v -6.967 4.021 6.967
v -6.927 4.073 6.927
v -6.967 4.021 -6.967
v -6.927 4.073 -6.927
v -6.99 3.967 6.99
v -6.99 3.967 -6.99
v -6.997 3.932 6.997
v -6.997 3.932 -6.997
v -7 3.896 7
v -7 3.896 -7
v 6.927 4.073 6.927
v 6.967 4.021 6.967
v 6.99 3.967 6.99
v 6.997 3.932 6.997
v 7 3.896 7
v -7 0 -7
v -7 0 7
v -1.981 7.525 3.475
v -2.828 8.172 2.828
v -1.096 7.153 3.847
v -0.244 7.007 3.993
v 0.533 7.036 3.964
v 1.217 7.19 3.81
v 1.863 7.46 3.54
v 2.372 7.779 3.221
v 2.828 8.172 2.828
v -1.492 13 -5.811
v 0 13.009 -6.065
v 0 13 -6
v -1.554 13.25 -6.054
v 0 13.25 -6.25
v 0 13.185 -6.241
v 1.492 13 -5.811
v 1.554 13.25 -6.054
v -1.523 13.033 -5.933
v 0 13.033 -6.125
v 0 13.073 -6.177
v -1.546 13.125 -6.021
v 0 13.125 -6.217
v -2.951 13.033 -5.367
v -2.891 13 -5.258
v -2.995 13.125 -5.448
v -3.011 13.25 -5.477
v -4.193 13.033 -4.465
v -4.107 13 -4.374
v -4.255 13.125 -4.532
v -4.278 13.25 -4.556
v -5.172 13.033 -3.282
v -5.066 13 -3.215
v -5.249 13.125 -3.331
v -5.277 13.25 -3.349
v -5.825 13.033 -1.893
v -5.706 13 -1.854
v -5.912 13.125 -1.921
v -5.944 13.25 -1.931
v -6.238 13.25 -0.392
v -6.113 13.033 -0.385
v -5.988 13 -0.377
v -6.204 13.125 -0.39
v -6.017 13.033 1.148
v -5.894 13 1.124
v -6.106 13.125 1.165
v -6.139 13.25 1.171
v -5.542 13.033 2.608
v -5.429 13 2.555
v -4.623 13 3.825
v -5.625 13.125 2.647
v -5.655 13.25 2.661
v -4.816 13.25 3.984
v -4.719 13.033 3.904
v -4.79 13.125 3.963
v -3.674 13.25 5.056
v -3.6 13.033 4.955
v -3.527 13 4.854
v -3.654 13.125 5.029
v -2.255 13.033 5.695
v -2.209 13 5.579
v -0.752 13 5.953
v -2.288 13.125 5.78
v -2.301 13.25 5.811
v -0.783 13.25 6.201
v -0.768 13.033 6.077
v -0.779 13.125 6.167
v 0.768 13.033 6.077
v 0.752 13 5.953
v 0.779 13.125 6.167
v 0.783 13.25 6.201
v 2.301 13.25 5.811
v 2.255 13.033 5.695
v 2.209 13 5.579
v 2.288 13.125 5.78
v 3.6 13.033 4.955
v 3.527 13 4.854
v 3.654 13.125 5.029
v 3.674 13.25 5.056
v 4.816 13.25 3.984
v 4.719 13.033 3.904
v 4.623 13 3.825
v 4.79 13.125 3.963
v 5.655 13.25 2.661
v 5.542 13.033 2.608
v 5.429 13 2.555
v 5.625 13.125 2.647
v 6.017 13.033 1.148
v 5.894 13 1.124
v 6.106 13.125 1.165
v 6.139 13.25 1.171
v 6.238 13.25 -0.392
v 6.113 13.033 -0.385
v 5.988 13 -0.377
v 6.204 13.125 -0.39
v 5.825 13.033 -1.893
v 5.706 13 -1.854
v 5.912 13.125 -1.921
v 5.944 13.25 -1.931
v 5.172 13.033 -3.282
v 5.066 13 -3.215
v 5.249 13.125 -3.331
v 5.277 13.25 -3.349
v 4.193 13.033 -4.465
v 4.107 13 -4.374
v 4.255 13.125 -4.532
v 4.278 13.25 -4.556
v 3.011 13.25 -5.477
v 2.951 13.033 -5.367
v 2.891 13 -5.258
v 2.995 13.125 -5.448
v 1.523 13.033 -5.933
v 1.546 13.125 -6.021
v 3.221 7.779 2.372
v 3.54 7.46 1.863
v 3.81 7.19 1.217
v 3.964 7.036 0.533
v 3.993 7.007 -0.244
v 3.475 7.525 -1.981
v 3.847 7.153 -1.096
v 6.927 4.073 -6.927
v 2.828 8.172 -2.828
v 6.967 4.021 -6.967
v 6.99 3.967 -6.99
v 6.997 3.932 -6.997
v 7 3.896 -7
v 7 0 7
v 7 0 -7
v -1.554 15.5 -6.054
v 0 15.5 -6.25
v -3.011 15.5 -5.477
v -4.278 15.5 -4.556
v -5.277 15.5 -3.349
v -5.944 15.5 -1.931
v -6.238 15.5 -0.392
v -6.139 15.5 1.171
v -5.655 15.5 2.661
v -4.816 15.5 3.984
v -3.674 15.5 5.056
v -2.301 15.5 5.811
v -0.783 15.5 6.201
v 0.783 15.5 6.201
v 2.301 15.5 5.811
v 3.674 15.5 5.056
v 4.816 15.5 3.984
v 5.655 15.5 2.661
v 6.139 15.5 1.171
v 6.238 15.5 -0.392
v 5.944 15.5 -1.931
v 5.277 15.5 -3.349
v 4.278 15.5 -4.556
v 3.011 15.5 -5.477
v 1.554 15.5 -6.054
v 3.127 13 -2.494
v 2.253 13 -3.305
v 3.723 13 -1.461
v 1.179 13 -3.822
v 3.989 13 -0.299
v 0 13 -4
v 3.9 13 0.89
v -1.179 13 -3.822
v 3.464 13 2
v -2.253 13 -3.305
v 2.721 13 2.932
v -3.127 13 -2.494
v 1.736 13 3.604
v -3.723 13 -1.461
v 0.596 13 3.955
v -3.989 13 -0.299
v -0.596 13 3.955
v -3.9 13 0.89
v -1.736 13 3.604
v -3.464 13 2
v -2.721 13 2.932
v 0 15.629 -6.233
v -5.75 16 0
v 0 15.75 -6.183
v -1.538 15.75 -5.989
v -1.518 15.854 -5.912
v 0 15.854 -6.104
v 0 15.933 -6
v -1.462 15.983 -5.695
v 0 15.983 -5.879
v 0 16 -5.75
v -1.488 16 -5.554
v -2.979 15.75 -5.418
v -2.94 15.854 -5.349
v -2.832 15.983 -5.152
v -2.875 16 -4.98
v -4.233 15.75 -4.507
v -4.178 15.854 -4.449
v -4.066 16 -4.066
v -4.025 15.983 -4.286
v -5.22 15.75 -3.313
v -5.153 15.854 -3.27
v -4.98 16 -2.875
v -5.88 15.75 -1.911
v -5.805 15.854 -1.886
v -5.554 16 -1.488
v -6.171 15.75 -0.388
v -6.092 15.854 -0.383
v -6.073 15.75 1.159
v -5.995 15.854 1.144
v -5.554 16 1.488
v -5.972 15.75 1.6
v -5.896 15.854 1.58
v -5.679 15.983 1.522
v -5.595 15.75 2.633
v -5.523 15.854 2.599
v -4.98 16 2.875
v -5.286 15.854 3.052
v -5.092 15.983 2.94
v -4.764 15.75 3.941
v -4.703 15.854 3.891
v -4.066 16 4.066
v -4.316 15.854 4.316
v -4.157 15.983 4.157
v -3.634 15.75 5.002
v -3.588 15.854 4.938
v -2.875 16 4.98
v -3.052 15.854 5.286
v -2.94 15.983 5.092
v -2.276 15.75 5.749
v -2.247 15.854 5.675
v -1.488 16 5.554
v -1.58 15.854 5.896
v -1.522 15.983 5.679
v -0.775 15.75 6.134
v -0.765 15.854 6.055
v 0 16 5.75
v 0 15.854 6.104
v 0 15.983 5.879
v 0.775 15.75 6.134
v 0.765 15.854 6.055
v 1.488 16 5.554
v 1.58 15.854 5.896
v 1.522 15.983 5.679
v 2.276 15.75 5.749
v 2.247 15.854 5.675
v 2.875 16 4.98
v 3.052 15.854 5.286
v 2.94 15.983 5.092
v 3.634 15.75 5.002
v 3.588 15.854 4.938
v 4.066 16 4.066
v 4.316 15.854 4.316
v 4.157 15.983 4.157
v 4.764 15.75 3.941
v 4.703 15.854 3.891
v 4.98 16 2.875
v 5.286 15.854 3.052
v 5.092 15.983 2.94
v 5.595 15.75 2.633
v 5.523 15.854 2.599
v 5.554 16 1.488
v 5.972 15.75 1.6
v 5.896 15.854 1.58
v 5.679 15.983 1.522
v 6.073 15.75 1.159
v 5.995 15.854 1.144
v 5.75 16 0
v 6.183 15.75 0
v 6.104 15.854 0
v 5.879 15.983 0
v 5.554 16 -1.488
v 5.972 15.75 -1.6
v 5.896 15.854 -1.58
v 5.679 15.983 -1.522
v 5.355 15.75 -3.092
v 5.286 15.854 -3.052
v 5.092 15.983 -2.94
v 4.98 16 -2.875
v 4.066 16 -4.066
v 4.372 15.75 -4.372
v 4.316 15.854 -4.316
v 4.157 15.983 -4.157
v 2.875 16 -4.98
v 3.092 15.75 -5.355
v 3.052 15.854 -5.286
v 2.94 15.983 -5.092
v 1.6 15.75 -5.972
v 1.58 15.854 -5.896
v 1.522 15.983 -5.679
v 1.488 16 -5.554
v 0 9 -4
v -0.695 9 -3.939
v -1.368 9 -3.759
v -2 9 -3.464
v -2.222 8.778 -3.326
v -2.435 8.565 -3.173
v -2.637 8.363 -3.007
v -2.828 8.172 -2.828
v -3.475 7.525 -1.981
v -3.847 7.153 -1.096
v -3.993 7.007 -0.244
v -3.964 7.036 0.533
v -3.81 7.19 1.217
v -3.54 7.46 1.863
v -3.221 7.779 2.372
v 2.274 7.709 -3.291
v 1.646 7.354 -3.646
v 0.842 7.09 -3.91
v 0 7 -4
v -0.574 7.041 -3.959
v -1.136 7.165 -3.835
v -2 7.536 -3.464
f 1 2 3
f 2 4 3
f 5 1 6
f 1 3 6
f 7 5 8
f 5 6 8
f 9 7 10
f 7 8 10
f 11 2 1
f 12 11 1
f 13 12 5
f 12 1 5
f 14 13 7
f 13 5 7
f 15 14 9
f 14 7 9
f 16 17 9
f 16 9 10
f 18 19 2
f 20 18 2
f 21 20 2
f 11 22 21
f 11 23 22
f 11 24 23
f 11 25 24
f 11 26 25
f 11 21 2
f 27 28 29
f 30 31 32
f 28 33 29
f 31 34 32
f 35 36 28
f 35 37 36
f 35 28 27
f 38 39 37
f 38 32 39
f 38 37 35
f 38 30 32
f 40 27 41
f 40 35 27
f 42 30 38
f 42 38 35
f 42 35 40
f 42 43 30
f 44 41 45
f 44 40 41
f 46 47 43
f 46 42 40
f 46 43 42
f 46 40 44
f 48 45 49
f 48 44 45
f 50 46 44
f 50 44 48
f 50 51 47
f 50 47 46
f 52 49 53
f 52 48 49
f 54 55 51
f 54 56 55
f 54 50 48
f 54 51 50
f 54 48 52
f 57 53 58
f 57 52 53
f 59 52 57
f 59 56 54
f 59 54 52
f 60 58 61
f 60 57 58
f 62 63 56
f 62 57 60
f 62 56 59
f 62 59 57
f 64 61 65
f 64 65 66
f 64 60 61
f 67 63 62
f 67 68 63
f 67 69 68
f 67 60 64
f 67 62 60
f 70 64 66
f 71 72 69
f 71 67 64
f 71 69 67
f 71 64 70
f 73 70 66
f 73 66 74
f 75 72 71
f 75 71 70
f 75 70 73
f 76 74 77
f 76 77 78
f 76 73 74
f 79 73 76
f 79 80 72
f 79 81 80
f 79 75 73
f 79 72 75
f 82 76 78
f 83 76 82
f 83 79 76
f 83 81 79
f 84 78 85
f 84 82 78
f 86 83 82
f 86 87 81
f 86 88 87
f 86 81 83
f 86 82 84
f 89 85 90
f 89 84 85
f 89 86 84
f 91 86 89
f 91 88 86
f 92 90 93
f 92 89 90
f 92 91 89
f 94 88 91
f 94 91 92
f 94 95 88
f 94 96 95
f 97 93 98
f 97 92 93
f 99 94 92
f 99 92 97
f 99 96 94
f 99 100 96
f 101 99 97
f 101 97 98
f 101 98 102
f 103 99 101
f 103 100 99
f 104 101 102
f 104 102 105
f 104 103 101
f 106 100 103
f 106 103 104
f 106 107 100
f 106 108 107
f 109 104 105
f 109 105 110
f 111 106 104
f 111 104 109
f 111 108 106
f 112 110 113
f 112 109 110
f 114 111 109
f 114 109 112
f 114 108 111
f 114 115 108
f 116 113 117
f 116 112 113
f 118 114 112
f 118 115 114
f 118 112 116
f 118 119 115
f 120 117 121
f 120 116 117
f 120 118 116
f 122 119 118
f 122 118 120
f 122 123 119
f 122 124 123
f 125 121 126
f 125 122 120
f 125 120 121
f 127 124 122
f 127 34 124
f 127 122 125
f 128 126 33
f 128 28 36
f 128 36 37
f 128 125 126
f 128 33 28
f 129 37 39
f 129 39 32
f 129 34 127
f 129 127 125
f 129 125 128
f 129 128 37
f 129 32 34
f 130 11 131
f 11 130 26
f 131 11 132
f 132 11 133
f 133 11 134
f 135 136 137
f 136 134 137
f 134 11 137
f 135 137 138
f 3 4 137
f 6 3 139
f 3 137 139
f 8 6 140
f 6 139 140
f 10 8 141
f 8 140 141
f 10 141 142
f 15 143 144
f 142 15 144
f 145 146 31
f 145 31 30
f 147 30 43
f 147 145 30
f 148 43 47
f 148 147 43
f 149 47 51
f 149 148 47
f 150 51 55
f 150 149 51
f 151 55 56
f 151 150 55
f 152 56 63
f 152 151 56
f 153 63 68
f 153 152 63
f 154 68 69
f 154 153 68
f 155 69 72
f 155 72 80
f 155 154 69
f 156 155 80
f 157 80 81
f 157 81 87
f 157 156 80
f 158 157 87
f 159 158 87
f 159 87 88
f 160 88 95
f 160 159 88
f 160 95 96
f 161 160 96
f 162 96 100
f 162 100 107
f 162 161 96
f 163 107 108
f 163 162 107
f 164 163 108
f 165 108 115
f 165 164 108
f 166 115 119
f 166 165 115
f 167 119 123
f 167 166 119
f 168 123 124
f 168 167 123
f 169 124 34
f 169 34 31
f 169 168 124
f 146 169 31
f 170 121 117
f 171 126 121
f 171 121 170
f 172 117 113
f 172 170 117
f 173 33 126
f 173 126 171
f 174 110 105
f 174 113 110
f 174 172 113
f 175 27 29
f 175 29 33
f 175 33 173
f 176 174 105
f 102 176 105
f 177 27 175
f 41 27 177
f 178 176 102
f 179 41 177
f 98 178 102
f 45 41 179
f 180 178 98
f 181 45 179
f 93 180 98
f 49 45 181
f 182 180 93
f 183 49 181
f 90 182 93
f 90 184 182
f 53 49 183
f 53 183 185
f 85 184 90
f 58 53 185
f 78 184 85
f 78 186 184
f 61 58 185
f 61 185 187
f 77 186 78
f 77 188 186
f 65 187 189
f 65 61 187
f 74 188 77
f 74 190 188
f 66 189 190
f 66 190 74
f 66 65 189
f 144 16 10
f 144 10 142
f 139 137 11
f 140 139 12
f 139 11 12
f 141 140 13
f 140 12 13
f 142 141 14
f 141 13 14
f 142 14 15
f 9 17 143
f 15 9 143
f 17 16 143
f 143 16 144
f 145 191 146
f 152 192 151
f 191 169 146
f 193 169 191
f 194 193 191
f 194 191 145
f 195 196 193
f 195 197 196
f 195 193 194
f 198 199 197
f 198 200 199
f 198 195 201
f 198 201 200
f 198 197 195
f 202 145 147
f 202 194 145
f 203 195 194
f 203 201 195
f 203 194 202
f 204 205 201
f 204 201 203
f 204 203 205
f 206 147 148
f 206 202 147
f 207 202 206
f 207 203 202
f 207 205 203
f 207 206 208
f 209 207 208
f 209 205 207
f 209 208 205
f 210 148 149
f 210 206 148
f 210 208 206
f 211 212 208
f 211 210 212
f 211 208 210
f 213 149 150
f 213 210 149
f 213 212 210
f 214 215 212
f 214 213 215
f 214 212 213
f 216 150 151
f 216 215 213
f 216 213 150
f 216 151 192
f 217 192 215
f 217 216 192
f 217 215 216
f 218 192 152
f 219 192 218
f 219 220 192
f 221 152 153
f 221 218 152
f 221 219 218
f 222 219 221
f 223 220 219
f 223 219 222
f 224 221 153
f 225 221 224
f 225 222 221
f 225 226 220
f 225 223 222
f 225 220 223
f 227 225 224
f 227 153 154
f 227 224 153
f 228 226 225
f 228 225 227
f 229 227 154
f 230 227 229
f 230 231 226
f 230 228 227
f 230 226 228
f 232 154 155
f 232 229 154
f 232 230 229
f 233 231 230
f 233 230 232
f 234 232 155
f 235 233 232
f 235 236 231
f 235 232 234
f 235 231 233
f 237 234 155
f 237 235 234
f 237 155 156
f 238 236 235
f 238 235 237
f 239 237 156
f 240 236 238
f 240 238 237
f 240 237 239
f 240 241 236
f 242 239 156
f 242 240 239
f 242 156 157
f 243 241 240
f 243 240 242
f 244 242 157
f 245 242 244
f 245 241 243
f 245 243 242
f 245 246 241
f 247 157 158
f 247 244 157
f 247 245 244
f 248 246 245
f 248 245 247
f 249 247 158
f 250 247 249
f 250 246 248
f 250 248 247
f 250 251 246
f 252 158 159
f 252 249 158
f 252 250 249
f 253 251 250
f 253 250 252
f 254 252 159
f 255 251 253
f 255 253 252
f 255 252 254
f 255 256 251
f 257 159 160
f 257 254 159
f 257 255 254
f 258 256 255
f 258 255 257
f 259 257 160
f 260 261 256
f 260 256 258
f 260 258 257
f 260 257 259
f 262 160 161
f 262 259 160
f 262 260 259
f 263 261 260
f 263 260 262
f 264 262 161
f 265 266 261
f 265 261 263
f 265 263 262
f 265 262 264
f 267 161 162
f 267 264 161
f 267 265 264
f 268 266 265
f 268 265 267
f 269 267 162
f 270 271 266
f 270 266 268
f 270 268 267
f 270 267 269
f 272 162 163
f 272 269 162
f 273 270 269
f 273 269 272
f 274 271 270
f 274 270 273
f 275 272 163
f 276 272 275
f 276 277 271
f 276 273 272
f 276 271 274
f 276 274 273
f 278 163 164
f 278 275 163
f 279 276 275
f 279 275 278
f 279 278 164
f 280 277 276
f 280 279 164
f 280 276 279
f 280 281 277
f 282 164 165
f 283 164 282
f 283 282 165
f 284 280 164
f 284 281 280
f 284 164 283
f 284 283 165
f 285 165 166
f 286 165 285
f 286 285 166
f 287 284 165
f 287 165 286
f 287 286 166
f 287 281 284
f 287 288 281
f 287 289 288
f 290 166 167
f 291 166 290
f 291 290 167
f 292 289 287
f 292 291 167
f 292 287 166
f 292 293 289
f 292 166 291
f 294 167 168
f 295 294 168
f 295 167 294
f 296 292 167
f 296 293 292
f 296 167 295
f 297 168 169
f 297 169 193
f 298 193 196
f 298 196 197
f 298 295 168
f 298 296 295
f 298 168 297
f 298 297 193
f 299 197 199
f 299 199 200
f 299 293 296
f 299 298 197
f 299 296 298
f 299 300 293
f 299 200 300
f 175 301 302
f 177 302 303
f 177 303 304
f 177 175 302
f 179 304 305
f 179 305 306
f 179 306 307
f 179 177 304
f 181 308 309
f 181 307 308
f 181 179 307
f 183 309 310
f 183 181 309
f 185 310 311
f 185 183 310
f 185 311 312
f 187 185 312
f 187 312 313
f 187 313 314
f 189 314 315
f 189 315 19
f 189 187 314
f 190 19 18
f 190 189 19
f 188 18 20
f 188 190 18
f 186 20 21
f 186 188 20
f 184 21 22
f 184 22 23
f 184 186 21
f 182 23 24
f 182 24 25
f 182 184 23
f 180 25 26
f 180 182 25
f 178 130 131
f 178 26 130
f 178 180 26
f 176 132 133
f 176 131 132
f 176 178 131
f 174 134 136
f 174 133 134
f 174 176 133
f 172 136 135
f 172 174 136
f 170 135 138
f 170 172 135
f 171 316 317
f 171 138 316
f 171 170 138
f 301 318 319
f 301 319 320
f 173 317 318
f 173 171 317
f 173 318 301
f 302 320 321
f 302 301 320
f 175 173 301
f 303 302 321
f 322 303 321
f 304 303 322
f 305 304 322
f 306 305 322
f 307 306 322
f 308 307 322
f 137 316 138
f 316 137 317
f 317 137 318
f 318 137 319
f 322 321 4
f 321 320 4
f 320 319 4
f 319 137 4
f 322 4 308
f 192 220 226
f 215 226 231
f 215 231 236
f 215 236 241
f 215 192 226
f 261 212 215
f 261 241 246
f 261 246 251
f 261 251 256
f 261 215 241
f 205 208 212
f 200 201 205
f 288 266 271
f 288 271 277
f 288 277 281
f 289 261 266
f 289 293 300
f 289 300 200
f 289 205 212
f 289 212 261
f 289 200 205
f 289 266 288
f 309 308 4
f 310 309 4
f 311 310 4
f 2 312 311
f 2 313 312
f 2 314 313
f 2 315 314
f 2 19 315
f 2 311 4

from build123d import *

# Parameters (mm, degrees)
SKIZZE1_W                       = 14
SKIZZE1_H                       = 14
AUFSATZ_LINEAR_AUSTRAGEN1_DEPTH = 16
FASE1_SIZE                      = 5
VERRUNDUNG2_R                   = 0.5
VERRUNDUNG3_R                   = 0.25
VERRUNDUNG4_R                   = 0.25


with BuildPart() as part:
    # Skizze1 → Aufsatz-Linear austragen1 (new body)
    with BuildSketch(Plane(origin=(0, 0, 0), x_dir=(1, 0, 0), z_dir=(0, 1, 0))):
        Rectangle(SKIZZE1_W, SKIZZE1_H)
    extrude(amount=AUFSATZ_LINEAR_AUSTRAGEN1_DEPTH)

    # Skizze6 → Schnitt-Rotation4 (revolve, cut)
    with BuildSketch(Plane(origin=(0, 0, 0), x_dir=(0, 0, -1), z_dir=(1, 0, 0))):
        Polygon((6.25, 16), (13.25, 16), (13.25, 9), (4, 9), (4, 13), (6.25, 13), align=None)
    revolve(axis=Axis((0, 0, 0), (0, 1, 0)), mode=Mode.SUBTRACT)

    # Fase1
    # the kernel refuses this chamfer: 5 mm, written as the material it takes off along each edge
    with BuildSketch(Plane(origin=(-7, 9, 19.85841494), x_dir=(0.9996219169112968, 0.027495876610586317, 0), z_dir=(0, 0, -1))) as fase1_piece_1_section:
        Polygon((FASE1_SIZE * 0.999621916911, FASE1_SIZE * 0.0274958766106), (-FASE1_SIZE * 0.0274958766106, FASE1_SIZE * 0.999621916911), (0, 0), align=None)
    fase1_piece_1 = extrude(amount=39.71682988, mode=Mode.PRIVATE)
    fase1_piece_1 = fase1_piece_1 - Plane(origin=(0, 7.328837599, 0), x_dir=(0, 0, -1), z_dir=(0, 1, 0)) * Cylinder(4, 100, mode=Mode.PRIVATE)
    add(fase1_piece_1, mode=Mode.SUBTRACT)
    with BuildSketch(Plane(origin=(-19.85841494, 9, -7), x_dir=(0, -0.9996219169112968, -0.027495876610586317), z_dir=(1, 0, 0))) as fase1_piece_2_section:
        Polygon((FASE1_SIZE * 0.999621916911, -FASE1_SIZE * 0.0274958766106), (-FASE1_SIZE * 0.0274958766106, -FASE1_SIZE * 0.999621916911), (0, 0), align=None)
    fase1_piece_2 = extrude(amount=39.71682988, mode=Mode.PRIVATE)
    fase1_piece_2 = fase1_piece_2 - Plane(origin=(0, 7.328837565, 0), x_dir=(0, 0, -1), z_dir=(0, 1, 0)) * Cylinder(4, 100, mode=Mode.PRIVATE)
    add(fase1_piece_2, mode=Mode.SUBTRACT)
    with BuildSketch(Plane(origin=(7, 9, -19.85841494), x_dir=(0.027495876610586317, -0.9996219169112968, 0), z_dir=(0, 0, 1))) as fase1_piece_3_section:
        Polygon((FASE1_SIZE * 0.999621916911, -FASE1_SIZE * 0.0274958766106), (-FASE1_SIZE * 0.0274958766106, -FASE1_SIZE * 0.999621916911), (0, 0), align=None)
    fase1_piece_3 = extrude(amount=39.71682988, mode=Mode.PRIVATE)
    fase1_piece_3 = fase1_piece_3 - Plane(origin=(0, 7.328837548, 0), x_dir=(0, 0, -1), z_dir=(0, 1, 0)) * Cylinder(4, 100, mode=Mode.PRIVATE)
    add(fase1_piece_3, mode=Mode.SUBTRACT)
    with BuildSketch(Plane(origin=(19.85841494, 9, 7), x_dir=(0, 0.027495876610586317, -0.9996219169112968), z_dir=(-1, 0, 0))) as fase1_piece_4_section:
        Polygon((FASE1_SIZE * 0.999621916911, FASE1_SIZE * 0.0274958766106), (-FASE1_SIZE * 0.0274958766106, FASE1_SIZE * 0.999621916911), (0, 0), align=None)
    fase1_piece_4 = extrude(amount=39.71682988, mode=Mode.PRIVATE)
    fase1_piece_4 = fase1_piece_4 - Plane(origin=(0, 7.328837599, 0), x_dir=(0, 0, -1), z_dir=(0, 1, 0)) * Cylinder(4, 100, mode=Mode.PRIVATE)
    add(fase1_piece_4, mode=Mode.SUBTRACT)

    # Verrundung2
    verrundung2_edges = [part.edges().sort_by_distance(p)[0] for p in [
        (0, 16, 6.25),
    ]]
    fillet(verrundung2_edges, radius=VERRUNDUNG2_R)

    # Verrundung3
    verrundung3_edges = [part.edges().sort_by_distance(p)[0] for p in [
        (-7, 4, 0),
        (0, 4, -7),
        (7, 4, 0),
        (0, 4, 7),
    ]]
    fillet(verrundung3_edges, radius=VERRUNDUNG3_R)

    # Verrundung4
    verrundung4_edges = [part.edges().sort_by_distance(p)[0] for p in [
        (0, 13, 6.25),
    ]]
    fillet(verrundung4_edges, radius=VERRUNDUNG4_R)


solid = part.part
